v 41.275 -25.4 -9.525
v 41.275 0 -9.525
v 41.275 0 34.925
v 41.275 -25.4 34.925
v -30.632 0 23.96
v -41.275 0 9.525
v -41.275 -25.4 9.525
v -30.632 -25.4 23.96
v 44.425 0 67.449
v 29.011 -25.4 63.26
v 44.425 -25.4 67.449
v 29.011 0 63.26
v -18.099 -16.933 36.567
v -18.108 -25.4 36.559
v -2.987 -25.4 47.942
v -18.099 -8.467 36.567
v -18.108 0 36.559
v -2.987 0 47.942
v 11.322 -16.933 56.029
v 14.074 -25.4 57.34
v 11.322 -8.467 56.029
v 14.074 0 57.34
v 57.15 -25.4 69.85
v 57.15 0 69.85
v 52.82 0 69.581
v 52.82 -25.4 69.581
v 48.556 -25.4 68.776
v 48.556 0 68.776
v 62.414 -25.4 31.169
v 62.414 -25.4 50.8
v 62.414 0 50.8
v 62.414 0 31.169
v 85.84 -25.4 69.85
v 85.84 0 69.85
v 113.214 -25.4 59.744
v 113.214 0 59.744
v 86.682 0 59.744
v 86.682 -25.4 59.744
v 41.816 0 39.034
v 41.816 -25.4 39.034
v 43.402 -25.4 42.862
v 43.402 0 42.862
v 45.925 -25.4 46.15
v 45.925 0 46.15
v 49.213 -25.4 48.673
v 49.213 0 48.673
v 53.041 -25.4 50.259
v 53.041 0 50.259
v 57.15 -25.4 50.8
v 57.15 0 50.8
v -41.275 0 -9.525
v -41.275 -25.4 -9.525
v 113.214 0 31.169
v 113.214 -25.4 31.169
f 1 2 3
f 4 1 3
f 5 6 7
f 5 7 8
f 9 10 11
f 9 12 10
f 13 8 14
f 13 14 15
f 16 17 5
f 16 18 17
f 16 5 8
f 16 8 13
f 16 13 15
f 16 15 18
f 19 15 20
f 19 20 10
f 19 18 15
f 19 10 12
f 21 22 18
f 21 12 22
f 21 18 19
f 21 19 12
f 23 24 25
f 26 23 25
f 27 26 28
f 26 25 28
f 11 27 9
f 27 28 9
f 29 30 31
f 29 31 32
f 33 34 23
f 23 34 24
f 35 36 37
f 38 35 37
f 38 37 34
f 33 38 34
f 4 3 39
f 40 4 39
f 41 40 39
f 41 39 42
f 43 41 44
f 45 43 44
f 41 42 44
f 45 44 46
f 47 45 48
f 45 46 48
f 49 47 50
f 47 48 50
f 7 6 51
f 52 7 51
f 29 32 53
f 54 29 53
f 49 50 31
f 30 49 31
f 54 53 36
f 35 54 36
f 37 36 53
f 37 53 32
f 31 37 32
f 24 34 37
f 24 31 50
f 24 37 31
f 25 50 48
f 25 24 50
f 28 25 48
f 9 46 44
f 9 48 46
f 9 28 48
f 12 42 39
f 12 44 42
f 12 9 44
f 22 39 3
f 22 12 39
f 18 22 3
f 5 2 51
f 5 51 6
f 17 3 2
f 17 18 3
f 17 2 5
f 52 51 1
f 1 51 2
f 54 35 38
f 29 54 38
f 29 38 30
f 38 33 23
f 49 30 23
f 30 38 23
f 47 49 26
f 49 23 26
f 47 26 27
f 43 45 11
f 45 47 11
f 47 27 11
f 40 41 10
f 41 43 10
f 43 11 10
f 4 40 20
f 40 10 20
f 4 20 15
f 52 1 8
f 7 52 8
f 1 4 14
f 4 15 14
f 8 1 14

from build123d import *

# Parameters (mm, degrees)
F1_DEPTH = 25.4


with BuildPart() as f1:
    # F0 (on Front) → F1 (new body)
    with BuildSketch(Plane.XZ):
        with BuildLine():
            add(Edge.make_bspline(
                [(-41.275, 9.525), (-22.0747437676, 40.2046527133), (10.3334958868, 60.2024181647), (44.4254317337, 67.4494675196)],
                knots=[0, 0, 0, 0, 100.1940888091, 100.1940888091, 100.1940888091, 100.1940888091], degree=3))
            Line((-41.275, 9.525), (22.225, 9.525))
            Line((22.225, 9.5250000022), (22.225, 34.925))
            ThreePointArc((22.225, 34.925), (28.3041929243, 54.6144651819), (44.4254317337, 67.4494675196))
        make_face()
        Polygon((22.225, 9.525), (-41.275, 9.525), (-41.275, -9.525), (41.275, -9.525), (41.275, 9.525), align=None)
        with BuildLine():
            Line((22.225, 34.925), (22.225, 9.5250000022))
            Line((22.225, 9.525), (41.275, 9.525))
            Line((41.275, 9.525), (41.275, 34.925))
            ThreePointArc((41.275, 34.925), (45.9246798487, 46.1503201513), (57.15, 50.8))
            Line((57.15, 50.8), (62.4140998637, 50.8))
            Line((62.4140998637, 50.8), (62.4140998637, 59.7440389732))
            Line((62.4140998637, 59.7440389732), (86.6818488397, 59.7440389732))
            Line((86.6818488397, 59.7440389732), (85.8401209116, 69.85))
            Line((85.8401209116, 69.85), (59.9131250273, 69.85))
            add(Edge.make_bspline(
                [(44.4254317337, 67.4494675196), (49.5629070715, 68.5415597229), (54.7386173045, 69.3440971379), (59.9131250273, 69.85)],
                knots=[100.1940888091, 100.1940888091, 100.1940888091, 100.1940888091, 115.2928107637, 115.2928107637, 115.2928107637, 115.2928107637], degree=3))
            ThreePointArc((44.4254317337, 67.4494675196), (28.3041929243, 54.6144651819), (22.225, 34.925))
        make_face()
        with BuildLine():
            ThreePointArc((57.15, 69.85), (50.675488556, 69.2446201401), (44.4254317337, 67.4494675196))
            add(Edge.make_bspline(
                [(44.4254317337, 67.4494675196), (49.5629070715, 68.5415597229), (54.7386173045, 69.3440971379), (59.9131250273, 69.85)],
                knots=[100.1940888091, 100.1940888091, 100.1940888091, 100.1940888091, 115.2928107637, 115.2928107637, 115.2928107637, 115.2928107637], degree=3))
            Line((59.9131250273, 69.85), (57.15, 69.85))
        make_face()
        Polygon((87.4268, 50.8), (86.6818488397, 59.7440389732), (62.4140998637, 59.7440389732), (62.4140998637, 50.8), align=None)
        Polygon((113.2140998637, 59.7440389732), (86.6818488397, 59.7440389732), (87.4268, 50.8), (62.4140998637, 50.8), (62.4140998637, 31.1690389732), (113.2140998637, 31.1690389732), align=None)
    extrude(amount=F1_DEPTH)


solid = f1.part
